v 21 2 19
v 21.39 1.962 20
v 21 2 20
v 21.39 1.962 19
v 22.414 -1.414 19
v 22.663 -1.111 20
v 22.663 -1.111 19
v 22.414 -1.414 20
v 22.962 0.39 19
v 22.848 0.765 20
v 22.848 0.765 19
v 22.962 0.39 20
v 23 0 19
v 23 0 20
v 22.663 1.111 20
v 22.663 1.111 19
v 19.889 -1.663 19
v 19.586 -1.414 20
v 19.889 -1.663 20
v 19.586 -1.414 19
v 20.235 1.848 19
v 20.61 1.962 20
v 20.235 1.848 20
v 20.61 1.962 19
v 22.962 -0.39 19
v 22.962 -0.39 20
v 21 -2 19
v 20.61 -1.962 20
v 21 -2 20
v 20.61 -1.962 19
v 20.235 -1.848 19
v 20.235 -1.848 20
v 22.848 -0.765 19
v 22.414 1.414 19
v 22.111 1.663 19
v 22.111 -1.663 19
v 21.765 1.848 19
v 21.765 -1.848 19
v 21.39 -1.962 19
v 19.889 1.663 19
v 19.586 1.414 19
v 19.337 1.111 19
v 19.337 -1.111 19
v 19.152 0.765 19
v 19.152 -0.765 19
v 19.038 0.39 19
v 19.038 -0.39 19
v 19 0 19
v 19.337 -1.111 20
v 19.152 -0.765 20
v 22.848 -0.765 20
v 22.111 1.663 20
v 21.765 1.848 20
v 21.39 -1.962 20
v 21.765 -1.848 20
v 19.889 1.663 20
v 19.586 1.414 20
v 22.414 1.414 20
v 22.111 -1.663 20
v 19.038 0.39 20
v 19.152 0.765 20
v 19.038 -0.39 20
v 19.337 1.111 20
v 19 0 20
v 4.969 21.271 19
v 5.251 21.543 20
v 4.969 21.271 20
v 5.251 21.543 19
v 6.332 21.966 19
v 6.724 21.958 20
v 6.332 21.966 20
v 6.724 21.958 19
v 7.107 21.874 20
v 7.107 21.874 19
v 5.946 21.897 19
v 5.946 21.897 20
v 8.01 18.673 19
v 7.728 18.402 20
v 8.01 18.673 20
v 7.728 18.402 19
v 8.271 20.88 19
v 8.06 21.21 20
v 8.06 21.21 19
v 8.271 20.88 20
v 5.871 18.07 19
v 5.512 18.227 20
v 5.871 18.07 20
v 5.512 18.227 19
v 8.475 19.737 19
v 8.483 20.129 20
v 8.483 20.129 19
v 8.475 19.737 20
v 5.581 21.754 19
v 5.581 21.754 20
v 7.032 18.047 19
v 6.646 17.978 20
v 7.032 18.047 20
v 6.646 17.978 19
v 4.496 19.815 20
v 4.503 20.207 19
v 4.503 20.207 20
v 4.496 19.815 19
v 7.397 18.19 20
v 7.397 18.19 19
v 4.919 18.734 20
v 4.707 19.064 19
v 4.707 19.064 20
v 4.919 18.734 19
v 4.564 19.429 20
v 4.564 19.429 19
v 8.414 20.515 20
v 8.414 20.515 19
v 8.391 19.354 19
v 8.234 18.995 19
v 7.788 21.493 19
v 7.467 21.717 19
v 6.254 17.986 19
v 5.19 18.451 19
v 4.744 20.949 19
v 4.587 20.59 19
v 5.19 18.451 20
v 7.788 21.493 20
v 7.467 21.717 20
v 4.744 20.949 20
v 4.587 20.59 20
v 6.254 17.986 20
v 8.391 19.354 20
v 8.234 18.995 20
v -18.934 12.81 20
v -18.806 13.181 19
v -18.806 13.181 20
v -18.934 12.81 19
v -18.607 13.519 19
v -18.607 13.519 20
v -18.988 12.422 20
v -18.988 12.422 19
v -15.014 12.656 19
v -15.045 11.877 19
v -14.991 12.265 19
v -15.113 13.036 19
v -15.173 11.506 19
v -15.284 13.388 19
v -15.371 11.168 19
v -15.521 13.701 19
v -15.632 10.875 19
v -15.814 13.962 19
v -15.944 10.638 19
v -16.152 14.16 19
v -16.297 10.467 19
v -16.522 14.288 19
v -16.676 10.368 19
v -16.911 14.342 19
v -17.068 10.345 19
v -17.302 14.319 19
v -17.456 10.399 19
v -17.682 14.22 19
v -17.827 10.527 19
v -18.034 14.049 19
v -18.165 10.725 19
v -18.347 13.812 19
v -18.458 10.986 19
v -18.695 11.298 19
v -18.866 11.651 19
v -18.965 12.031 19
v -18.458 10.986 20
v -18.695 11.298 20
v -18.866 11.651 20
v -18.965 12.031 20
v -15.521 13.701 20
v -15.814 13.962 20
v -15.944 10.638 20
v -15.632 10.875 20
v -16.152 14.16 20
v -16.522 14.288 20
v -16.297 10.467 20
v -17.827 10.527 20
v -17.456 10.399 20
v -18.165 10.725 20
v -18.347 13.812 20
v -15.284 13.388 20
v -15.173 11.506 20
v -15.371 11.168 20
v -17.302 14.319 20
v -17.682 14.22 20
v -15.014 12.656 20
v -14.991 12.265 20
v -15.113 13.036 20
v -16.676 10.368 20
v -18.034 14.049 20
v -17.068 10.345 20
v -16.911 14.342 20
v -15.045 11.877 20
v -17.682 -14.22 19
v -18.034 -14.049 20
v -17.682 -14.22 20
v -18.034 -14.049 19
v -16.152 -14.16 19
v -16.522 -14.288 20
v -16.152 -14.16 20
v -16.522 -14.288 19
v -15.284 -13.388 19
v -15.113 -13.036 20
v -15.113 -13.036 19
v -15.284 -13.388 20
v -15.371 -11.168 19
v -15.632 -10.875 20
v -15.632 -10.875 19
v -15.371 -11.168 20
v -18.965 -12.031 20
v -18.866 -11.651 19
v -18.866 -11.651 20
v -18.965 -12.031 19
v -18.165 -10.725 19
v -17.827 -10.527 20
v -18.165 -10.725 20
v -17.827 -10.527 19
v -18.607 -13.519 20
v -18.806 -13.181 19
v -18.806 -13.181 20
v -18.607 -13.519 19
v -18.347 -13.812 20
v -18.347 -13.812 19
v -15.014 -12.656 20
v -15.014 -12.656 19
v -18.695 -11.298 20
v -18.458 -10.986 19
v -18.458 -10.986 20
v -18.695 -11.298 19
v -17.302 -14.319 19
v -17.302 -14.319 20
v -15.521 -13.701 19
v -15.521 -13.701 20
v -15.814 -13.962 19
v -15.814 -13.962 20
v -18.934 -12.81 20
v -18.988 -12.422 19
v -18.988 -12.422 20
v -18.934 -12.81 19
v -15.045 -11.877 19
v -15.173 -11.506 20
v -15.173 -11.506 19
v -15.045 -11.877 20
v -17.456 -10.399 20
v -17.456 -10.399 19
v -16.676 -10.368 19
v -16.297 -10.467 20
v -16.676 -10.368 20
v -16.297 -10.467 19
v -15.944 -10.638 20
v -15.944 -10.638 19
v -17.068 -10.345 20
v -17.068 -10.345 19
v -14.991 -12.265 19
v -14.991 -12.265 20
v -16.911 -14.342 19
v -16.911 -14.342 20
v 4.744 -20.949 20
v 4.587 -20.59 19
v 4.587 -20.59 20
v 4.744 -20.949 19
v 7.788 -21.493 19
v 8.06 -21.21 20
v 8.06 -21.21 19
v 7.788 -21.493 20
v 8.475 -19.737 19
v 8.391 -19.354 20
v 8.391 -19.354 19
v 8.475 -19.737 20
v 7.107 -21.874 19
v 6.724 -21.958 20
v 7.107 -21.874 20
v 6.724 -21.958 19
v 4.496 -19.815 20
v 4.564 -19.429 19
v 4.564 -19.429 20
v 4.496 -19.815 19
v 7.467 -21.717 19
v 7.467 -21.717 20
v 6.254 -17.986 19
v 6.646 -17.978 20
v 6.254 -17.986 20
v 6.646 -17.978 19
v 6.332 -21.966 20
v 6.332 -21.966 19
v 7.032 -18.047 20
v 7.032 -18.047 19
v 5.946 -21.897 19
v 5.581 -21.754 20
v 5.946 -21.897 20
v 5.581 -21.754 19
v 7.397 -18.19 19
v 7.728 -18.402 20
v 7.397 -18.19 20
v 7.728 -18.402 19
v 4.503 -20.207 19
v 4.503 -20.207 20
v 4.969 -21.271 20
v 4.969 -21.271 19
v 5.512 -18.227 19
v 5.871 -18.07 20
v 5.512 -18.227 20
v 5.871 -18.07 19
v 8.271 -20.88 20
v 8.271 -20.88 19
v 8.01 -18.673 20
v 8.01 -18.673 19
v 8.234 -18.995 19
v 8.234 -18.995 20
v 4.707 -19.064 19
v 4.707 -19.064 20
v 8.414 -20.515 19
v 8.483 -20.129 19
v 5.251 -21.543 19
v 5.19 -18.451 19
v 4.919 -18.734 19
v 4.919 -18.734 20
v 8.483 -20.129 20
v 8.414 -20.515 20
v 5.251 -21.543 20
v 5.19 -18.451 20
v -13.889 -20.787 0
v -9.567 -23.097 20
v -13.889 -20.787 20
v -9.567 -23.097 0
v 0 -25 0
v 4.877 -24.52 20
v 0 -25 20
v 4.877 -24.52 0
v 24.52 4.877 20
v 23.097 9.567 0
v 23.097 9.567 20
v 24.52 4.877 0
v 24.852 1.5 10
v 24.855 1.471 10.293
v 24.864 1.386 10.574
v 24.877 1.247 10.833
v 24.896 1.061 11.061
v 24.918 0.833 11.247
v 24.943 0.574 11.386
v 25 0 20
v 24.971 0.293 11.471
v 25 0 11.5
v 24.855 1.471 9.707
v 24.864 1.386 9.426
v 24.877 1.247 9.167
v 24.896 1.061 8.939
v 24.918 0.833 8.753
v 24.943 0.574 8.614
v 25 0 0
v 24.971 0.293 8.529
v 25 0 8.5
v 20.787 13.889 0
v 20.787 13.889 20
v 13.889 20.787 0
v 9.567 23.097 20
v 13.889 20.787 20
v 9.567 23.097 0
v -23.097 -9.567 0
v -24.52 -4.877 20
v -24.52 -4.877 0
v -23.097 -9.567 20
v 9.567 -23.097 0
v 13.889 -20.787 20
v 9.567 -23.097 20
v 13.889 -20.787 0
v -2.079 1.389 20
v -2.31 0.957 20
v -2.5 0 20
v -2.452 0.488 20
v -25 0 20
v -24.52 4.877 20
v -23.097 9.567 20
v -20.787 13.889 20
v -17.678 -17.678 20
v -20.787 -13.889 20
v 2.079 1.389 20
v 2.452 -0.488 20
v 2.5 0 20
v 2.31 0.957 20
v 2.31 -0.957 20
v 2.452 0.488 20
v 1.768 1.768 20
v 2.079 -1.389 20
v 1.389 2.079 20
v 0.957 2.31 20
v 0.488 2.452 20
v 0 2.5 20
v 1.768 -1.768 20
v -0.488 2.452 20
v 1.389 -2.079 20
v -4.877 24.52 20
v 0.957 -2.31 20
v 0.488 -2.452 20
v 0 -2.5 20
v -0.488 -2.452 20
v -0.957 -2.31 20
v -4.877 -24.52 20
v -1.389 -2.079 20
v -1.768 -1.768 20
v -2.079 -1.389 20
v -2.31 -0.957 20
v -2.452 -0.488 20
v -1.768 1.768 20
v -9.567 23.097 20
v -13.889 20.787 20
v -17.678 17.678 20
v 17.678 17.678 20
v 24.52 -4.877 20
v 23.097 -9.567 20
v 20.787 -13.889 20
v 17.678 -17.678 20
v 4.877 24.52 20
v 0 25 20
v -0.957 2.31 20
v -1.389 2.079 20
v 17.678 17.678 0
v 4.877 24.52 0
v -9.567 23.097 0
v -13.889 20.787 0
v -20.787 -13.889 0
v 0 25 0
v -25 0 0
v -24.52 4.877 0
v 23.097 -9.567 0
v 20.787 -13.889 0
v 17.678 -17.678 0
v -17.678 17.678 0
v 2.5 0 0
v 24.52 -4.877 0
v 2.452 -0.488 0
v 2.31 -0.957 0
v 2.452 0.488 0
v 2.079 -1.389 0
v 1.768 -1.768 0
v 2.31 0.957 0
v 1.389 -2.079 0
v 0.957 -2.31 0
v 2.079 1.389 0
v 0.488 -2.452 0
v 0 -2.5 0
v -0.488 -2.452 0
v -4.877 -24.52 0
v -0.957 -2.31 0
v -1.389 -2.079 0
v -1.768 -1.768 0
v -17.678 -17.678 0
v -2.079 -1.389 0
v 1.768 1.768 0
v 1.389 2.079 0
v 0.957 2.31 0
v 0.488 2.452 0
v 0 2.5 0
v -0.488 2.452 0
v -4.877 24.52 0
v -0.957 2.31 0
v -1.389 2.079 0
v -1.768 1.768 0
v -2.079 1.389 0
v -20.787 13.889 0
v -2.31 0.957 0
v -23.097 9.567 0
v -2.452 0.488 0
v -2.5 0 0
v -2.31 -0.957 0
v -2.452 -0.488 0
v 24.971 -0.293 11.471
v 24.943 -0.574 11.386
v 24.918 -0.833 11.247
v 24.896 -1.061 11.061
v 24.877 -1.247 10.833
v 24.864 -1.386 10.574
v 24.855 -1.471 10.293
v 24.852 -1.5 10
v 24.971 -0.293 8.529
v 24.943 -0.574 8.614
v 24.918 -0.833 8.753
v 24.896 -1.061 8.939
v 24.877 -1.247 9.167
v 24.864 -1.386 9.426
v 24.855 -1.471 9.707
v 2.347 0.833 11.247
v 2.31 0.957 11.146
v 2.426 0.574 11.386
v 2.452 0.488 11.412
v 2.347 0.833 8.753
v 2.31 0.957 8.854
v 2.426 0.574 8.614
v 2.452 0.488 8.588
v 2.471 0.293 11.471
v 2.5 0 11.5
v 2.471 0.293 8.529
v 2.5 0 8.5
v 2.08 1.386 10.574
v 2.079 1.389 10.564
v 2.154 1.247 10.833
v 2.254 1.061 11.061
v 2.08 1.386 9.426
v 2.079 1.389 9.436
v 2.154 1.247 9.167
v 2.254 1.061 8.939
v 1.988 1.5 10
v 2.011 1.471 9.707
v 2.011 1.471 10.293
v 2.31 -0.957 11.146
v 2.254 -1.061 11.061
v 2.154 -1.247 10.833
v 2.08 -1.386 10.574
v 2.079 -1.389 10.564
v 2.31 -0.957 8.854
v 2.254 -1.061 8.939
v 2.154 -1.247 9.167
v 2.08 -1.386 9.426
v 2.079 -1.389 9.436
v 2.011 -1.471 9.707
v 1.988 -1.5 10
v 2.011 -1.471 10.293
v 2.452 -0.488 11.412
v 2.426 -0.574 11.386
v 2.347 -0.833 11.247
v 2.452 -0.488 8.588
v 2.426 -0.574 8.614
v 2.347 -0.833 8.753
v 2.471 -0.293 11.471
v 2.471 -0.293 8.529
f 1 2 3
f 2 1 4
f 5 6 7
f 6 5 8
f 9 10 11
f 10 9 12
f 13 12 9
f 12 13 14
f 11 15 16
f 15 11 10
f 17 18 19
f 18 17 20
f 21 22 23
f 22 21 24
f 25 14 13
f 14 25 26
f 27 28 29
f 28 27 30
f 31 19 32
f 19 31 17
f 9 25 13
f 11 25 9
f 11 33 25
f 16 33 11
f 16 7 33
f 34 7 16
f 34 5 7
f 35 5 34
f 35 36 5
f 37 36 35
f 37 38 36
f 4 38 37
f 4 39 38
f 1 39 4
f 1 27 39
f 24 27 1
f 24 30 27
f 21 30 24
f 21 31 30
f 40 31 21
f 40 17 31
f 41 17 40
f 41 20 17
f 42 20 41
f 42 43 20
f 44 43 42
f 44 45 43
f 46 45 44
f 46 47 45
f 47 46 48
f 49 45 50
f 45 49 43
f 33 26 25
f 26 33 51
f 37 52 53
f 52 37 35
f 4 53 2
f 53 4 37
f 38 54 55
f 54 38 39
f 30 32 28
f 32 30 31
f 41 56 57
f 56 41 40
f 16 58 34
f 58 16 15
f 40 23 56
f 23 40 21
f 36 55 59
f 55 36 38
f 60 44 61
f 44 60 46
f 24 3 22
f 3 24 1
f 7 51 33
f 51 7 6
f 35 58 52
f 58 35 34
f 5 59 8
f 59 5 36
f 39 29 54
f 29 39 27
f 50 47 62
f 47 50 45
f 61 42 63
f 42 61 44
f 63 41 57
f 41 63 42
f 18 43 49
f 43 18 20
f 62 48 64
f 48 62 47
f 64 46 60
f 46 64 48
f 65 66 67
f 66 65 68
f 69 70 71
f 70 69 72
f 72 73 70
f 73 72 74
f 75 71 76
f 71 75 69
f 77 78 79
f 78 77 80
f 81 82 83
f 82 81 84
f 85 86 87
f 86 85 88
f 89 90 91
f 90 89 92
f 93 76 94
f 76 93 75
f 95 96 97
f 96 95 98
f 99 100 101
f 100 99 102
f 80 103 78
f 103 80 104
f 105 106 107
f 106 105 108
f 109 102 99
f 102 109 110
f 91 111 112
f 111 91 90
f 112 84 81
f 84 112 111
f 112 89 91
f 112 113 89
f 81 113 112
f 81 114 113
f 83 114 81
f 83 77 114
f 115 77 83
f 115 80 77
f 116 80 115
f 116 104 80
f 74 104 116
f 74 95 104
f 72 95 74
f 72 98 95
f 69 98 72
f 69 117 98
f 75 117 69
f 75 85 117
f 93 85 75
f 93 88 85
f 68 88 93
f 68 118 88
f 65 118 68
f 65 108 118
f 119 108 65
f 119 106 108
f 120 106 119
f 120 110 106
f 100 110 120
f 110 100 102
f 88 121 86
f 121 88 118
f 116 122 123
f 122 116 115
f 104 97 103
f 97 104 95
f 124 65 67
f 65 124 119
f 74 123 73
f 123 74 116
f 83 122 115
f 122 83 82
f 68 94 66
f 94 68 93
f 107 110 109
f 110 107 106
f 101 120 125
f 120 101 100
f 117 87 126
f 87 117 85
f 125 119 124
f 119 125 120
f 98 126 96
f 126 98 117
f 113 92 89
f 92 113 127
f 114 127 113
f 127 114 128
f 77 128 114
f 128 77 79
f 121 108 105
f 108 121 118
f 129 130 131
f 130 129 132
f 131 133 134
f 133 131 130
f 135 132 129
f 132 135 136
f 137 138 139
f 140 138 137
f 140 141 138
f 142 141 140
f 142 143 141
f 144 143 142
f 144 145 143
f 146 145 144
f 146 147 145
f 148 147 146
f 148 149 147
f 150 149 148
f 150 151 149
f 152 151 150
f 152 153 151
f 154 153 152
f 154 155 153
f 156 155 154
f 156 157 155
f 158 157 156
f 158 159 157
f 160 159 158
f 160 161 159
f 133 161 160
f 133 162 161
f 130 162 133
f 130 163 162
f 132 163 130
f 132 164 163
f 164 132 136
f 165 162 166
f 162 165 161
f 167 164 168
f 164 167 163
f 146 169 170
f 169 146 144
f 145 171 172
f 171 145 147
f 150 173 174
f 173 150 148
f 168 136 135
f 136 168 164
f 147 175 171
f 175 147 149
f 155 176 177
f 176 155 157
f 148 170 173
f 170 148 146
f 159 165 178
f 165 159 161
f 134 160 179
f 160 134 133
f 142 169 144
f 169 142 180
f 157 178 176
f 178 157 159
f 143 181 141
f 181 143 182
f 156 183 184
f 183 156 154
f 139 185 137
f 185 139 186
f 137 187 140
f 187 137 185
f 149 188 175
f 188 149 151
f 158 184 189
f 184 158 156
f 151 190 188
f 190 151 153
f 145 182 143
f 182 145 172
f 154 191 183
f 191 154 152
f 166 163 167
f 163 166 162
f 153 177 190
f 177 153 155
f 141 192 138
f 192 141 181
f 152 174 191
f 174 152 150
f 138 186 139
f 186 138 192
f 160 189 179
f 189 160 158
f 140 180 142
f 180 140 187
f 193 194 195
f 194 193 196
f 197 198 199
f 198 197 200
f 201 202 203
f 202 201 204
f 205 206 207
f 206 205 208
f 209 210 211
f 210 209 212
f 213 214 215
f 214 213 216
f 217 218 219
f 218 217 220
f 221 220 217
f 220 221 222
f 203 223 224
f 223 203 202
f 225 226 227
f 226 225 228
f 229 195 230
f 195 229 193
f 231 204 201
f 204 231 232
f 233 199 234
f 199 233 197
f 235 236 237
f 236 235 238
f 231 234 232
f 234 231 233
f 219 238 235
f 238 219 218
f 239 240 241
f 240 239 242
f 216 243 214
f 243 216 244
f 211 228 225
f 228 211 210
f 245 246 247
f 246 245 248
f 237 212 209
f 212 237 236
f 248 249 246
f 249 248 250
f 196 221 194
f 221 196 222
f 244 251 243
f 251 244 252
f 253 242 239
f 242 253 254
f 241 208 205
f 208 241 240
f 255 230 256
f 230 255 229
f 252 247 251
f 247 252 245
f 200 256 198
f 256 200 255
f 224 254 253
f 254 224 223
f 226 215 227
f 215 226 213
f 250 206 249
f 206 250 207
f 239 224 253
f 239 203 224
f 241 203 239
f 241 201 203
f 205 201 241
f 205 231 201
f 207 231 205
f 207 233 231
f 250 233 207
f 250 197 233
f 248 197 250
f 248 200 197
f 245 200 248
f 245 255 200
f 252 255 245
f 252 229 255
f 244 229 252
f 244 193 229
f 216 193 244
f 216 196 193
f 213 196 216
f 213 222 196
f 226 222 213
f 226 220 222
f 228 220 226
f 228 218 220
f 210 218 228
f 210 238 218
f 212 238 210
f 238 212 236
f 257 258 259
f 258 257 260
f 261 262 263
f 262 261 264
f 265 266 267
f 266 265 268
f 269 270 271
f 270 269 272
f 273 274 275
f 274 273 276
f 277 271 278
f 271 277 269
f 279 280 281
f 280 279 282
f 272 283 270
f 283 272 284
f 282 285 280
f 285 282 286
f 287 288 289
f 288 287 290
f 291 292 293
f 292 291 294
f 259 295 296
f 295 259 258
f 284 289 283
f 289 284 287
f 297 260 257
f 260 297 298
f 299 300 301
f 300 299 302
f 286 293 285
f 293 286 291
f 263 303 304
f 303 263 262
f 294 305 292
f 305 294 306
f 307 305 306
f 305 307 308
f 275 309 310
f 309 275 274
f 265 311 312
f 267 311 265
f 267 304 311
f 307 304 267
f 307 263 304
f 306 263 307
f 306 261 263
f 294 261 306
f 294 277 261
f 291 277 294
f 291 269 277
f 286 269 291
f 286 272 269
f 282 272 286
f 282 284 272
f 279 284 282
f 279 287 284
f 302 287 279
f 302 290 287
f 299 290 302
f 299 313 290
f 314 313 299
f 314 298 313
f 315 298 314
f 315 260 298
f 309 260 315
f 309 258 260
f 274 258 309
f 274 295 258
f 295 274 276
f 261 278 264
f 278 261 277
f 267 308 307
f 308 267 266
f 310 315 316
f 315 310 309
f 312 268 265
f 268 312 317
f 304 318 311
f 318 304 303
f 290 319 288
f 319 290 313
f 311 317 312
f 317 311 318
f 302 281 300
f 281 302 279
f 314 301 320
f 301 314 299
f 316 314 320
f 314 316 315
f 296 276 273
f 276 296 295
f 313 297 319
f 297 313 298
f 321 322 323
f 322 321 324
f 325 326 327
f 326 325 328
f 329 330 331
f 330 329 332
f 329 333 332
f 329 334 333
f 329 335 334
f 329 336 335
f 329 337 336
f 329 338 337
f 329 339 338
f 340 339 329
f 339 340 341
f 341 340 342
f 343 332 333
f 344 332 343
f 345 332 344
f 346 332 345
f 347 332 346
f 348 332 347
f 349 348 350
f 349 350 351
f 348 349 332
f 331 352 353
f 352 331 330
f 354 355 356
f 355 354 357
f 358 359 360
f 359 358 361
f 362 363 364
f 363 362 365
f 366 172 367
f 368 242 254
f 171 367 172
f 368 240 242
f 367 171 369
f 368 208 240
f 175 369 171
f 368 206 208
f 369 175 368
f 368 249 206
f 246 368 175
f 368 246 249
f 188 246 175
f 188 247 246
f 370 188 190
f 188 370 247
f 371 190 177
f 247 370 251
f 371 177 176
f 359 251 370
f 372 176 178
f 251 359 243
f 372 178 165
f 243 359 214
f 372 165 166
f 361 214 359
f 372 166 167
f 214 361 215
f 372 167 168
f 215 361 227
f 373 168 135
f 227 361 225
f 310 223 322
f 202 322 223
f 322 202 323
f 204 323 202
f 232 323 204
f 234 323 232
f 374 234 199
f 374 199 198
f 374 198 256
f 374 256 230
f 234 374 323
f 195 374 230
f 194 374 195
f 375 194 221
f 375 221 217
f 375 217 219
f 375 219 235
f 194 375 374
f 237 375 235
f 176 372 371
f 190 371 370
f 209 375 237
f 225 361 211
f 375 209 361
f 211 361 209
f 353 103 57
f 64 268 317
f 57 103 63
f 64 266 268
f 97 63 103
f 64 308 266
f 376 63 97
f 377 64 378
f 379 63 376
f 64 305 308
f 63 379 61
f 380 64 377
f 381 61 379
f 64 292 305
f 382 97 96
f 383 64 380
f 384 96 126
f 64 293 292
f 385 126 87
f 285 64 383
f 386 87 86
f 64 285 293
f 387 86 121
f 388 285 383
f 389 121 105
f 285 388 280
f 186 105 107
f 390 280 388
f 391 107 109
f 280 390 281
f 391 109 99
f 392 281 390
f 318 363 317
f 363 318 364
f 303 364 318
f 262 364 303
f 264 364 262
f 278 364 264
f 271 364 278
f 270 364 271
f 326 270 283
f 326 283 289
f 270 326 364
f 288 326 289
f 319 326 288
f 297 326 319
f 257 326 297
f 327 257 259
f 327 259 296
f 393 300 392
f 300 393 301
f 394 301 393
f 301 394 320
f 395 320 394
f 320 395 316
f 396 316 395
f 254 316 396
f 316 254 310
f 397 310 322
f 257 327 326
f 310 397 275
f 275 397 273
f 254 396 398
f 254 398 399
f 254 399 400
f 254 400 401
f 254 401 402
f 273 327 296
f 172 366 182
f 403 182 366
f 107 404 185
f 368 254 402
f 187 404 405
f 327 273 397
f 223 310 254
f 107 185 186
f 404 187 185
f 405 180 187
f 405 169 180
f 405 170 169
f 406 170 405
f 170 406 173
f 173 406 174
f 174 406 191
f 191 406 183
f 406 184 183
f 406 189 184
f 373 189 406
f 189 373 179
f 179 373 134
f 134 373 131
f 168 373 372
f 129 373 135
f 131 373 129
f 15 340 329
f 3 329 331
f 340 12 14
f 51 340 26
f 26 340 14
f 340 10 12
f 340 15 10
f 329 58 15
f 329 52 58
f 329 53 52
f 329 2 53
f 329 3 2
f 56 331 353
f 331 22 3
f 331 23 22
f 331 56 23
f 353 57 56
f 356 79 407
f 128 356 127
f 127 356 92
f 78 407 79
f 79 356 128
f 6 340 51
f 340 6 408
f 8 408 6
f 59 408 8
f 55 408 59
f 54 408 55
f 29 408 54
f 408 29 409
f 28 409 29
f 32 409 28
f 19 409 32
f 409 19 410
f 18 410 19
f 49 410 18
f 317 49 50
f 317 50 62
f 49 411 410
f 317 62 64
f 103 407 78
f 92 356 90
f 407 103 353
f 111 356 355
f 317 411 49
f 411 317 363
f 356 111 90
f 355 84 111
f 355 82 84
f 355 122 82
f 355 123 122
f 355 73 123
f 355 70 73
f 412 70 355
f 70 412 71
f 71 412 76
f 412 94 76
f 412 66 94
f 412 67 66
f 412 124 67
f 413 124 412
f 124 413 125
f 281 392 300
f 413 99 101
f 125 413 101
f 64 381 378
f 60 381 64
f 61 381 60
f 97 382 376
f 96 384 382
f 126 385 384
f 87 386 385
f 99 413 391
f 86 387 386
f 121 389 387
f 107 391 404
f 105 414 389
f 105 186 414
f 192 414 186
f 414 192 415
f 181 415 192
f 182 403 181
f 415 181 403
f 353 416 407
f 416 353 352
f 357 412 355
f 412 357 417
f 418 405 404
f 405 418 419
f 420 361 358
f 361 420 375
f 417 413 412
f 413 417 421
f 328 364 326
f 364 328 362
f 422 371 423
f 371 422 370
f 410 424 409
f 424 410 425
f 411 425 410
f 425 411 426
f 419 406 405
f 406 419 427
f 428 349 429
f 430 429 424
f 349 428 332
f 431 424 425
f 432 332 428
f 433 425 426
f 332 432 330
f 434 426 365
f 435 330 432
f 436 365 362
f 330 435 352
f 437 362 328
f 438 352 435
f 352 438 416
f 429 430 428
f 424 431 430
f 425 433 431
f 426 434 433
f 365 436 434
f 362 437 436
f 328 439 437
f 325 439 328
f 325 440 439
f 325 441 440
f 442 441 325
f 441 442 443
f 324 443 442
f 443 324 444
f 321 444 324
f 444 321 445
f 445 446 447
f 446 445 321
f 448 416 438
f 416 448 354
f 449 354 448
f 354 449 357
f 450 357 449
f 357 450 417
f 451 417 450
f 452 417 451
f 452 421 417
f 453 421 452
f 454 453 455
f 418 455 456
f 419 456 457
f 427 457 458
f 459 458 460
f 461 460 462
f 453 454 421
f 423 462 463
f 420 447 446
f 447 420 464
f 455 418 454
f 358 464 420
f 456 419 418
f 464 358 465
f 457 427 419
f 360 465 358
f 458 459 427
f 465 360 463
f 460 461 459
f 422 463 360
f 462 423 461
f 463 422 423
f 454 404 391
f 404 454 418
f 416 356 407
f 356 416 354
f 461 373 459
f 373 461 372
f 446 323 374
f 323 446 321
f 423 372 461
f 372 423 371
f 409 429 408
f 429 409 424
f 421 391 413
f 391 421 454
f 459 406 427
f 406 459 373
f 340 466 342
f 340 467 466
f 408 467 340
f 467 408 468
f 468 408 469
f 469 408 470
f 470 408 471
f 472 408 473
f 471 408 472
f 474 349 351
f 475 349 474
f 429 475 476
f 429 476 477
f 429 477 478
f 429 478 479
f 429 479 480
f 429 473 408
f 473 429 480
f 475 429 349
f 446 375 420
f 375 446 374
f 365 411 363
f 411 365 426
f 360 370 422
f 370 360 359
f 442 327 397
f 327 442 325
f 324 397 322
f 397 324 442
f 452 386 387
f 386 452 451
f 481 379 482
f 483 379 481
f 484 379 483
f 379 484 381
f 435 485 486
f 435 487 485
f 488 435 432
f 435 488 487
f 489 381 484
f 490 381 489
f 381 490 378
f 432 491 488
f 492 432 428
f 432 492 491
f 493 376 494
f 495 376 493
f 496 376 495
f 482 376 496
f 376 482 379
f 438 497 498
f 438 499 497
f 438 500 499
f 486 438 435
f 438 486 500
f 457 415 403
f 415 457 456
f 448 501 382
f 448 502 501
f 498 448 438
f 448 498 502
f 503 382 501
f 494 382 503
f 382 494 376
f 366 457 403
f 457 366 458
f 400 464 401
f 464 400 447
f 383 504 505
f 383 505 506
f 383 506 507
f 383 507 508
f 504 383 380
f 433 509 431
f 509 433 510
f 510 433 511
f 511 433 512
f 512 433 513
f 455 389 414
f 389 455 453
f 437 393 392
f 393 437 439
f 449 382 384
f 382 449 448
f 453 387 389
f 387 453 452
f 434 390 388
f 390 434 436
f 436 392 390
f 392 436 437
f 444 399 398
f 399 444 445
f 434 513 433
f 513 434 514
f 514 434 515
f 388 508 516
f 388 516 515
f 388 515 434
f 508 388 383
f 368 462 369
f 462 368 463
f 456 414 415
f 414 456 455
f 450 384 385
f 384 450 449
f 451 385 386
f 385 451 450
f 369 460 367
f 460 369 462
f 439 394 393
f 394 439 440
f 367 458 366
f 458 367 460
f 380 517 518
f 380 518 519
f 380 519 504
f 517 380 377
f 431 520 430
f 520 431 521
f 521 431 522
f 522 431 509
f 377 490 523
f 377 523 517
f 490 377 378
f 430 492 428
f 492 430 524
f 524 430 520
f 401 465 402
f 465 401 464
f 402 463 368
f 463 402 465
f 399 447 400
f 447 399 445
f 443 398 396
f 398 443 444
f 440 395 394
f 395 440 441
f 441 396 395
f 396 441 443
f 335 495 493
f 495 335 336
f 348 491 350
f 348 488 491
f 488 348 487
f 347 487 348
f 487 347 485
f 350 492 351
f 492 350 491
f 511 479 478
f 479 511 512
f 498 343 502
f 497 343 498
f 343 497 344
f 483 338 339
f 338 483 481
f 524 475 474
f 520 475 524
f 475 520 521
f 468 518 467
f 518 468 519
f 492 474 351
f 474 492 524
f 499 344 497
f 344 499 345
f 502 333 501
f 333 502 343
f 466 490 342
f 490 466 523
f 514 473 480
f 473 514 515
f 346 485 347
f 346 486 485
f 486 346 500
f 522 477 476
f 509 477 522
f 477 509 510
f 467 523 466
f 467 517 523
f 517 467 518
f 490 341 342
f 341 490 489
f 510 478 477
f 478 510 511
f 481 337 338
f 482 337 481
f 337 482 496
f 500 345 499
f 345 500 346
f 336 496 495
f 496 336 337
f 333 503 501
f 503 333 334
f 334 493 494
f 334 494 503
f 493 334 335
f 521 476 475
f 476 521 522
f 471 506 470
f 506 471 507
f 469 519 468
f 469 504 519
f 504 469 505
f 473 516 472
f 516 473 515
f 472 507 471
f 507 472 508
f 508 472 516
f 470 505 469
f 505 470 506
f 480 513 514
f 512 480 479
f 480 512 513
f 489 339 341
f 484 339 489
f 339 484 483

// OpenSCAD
$fn = 32;

// ----------------------------------------------------------------------
// Control knob: dimpled knob
// ----------------------------------------------------------------------

// --- parameters (mm) ---
dimp_d = 4;               // finger dimple diameter
n_dimp = 5;               // number of dimples
dimp_r = 21;              // dimple ring radius
knob_d = 50;              // knob body diameter
knob_h = 20;              // knob body height
bore_d = 5;               // shaft bore diameter
set_d = 3;                // set screw bore diameter
fit_tol = 0.1;            // tolerance for press fits, mm
free_tol = 0.3;           // tolerance for clearance fits, mm

dimp_step = 360 / n_dimp;  // dimple angular step

difference() {
  cylinder(h = knob_h, d = knob_d);
  translate([0, 0, -1]) cylinder(h = knob_h + 2, d = bore_d);
  translate([-1, 0, knob_h / 2]) rotate([0, 90, 0])
    cylinder(h = knob_d / 2 + bore_d / 2 + 2, d = set_d);  for (i = [0 : n_dimp - 1])
    rotate([0, 0, i * dimp_step])
      translate([dimp_r, 0, knob_h - 1])
        cylinder(h = 2, d = dimp_d);
}
